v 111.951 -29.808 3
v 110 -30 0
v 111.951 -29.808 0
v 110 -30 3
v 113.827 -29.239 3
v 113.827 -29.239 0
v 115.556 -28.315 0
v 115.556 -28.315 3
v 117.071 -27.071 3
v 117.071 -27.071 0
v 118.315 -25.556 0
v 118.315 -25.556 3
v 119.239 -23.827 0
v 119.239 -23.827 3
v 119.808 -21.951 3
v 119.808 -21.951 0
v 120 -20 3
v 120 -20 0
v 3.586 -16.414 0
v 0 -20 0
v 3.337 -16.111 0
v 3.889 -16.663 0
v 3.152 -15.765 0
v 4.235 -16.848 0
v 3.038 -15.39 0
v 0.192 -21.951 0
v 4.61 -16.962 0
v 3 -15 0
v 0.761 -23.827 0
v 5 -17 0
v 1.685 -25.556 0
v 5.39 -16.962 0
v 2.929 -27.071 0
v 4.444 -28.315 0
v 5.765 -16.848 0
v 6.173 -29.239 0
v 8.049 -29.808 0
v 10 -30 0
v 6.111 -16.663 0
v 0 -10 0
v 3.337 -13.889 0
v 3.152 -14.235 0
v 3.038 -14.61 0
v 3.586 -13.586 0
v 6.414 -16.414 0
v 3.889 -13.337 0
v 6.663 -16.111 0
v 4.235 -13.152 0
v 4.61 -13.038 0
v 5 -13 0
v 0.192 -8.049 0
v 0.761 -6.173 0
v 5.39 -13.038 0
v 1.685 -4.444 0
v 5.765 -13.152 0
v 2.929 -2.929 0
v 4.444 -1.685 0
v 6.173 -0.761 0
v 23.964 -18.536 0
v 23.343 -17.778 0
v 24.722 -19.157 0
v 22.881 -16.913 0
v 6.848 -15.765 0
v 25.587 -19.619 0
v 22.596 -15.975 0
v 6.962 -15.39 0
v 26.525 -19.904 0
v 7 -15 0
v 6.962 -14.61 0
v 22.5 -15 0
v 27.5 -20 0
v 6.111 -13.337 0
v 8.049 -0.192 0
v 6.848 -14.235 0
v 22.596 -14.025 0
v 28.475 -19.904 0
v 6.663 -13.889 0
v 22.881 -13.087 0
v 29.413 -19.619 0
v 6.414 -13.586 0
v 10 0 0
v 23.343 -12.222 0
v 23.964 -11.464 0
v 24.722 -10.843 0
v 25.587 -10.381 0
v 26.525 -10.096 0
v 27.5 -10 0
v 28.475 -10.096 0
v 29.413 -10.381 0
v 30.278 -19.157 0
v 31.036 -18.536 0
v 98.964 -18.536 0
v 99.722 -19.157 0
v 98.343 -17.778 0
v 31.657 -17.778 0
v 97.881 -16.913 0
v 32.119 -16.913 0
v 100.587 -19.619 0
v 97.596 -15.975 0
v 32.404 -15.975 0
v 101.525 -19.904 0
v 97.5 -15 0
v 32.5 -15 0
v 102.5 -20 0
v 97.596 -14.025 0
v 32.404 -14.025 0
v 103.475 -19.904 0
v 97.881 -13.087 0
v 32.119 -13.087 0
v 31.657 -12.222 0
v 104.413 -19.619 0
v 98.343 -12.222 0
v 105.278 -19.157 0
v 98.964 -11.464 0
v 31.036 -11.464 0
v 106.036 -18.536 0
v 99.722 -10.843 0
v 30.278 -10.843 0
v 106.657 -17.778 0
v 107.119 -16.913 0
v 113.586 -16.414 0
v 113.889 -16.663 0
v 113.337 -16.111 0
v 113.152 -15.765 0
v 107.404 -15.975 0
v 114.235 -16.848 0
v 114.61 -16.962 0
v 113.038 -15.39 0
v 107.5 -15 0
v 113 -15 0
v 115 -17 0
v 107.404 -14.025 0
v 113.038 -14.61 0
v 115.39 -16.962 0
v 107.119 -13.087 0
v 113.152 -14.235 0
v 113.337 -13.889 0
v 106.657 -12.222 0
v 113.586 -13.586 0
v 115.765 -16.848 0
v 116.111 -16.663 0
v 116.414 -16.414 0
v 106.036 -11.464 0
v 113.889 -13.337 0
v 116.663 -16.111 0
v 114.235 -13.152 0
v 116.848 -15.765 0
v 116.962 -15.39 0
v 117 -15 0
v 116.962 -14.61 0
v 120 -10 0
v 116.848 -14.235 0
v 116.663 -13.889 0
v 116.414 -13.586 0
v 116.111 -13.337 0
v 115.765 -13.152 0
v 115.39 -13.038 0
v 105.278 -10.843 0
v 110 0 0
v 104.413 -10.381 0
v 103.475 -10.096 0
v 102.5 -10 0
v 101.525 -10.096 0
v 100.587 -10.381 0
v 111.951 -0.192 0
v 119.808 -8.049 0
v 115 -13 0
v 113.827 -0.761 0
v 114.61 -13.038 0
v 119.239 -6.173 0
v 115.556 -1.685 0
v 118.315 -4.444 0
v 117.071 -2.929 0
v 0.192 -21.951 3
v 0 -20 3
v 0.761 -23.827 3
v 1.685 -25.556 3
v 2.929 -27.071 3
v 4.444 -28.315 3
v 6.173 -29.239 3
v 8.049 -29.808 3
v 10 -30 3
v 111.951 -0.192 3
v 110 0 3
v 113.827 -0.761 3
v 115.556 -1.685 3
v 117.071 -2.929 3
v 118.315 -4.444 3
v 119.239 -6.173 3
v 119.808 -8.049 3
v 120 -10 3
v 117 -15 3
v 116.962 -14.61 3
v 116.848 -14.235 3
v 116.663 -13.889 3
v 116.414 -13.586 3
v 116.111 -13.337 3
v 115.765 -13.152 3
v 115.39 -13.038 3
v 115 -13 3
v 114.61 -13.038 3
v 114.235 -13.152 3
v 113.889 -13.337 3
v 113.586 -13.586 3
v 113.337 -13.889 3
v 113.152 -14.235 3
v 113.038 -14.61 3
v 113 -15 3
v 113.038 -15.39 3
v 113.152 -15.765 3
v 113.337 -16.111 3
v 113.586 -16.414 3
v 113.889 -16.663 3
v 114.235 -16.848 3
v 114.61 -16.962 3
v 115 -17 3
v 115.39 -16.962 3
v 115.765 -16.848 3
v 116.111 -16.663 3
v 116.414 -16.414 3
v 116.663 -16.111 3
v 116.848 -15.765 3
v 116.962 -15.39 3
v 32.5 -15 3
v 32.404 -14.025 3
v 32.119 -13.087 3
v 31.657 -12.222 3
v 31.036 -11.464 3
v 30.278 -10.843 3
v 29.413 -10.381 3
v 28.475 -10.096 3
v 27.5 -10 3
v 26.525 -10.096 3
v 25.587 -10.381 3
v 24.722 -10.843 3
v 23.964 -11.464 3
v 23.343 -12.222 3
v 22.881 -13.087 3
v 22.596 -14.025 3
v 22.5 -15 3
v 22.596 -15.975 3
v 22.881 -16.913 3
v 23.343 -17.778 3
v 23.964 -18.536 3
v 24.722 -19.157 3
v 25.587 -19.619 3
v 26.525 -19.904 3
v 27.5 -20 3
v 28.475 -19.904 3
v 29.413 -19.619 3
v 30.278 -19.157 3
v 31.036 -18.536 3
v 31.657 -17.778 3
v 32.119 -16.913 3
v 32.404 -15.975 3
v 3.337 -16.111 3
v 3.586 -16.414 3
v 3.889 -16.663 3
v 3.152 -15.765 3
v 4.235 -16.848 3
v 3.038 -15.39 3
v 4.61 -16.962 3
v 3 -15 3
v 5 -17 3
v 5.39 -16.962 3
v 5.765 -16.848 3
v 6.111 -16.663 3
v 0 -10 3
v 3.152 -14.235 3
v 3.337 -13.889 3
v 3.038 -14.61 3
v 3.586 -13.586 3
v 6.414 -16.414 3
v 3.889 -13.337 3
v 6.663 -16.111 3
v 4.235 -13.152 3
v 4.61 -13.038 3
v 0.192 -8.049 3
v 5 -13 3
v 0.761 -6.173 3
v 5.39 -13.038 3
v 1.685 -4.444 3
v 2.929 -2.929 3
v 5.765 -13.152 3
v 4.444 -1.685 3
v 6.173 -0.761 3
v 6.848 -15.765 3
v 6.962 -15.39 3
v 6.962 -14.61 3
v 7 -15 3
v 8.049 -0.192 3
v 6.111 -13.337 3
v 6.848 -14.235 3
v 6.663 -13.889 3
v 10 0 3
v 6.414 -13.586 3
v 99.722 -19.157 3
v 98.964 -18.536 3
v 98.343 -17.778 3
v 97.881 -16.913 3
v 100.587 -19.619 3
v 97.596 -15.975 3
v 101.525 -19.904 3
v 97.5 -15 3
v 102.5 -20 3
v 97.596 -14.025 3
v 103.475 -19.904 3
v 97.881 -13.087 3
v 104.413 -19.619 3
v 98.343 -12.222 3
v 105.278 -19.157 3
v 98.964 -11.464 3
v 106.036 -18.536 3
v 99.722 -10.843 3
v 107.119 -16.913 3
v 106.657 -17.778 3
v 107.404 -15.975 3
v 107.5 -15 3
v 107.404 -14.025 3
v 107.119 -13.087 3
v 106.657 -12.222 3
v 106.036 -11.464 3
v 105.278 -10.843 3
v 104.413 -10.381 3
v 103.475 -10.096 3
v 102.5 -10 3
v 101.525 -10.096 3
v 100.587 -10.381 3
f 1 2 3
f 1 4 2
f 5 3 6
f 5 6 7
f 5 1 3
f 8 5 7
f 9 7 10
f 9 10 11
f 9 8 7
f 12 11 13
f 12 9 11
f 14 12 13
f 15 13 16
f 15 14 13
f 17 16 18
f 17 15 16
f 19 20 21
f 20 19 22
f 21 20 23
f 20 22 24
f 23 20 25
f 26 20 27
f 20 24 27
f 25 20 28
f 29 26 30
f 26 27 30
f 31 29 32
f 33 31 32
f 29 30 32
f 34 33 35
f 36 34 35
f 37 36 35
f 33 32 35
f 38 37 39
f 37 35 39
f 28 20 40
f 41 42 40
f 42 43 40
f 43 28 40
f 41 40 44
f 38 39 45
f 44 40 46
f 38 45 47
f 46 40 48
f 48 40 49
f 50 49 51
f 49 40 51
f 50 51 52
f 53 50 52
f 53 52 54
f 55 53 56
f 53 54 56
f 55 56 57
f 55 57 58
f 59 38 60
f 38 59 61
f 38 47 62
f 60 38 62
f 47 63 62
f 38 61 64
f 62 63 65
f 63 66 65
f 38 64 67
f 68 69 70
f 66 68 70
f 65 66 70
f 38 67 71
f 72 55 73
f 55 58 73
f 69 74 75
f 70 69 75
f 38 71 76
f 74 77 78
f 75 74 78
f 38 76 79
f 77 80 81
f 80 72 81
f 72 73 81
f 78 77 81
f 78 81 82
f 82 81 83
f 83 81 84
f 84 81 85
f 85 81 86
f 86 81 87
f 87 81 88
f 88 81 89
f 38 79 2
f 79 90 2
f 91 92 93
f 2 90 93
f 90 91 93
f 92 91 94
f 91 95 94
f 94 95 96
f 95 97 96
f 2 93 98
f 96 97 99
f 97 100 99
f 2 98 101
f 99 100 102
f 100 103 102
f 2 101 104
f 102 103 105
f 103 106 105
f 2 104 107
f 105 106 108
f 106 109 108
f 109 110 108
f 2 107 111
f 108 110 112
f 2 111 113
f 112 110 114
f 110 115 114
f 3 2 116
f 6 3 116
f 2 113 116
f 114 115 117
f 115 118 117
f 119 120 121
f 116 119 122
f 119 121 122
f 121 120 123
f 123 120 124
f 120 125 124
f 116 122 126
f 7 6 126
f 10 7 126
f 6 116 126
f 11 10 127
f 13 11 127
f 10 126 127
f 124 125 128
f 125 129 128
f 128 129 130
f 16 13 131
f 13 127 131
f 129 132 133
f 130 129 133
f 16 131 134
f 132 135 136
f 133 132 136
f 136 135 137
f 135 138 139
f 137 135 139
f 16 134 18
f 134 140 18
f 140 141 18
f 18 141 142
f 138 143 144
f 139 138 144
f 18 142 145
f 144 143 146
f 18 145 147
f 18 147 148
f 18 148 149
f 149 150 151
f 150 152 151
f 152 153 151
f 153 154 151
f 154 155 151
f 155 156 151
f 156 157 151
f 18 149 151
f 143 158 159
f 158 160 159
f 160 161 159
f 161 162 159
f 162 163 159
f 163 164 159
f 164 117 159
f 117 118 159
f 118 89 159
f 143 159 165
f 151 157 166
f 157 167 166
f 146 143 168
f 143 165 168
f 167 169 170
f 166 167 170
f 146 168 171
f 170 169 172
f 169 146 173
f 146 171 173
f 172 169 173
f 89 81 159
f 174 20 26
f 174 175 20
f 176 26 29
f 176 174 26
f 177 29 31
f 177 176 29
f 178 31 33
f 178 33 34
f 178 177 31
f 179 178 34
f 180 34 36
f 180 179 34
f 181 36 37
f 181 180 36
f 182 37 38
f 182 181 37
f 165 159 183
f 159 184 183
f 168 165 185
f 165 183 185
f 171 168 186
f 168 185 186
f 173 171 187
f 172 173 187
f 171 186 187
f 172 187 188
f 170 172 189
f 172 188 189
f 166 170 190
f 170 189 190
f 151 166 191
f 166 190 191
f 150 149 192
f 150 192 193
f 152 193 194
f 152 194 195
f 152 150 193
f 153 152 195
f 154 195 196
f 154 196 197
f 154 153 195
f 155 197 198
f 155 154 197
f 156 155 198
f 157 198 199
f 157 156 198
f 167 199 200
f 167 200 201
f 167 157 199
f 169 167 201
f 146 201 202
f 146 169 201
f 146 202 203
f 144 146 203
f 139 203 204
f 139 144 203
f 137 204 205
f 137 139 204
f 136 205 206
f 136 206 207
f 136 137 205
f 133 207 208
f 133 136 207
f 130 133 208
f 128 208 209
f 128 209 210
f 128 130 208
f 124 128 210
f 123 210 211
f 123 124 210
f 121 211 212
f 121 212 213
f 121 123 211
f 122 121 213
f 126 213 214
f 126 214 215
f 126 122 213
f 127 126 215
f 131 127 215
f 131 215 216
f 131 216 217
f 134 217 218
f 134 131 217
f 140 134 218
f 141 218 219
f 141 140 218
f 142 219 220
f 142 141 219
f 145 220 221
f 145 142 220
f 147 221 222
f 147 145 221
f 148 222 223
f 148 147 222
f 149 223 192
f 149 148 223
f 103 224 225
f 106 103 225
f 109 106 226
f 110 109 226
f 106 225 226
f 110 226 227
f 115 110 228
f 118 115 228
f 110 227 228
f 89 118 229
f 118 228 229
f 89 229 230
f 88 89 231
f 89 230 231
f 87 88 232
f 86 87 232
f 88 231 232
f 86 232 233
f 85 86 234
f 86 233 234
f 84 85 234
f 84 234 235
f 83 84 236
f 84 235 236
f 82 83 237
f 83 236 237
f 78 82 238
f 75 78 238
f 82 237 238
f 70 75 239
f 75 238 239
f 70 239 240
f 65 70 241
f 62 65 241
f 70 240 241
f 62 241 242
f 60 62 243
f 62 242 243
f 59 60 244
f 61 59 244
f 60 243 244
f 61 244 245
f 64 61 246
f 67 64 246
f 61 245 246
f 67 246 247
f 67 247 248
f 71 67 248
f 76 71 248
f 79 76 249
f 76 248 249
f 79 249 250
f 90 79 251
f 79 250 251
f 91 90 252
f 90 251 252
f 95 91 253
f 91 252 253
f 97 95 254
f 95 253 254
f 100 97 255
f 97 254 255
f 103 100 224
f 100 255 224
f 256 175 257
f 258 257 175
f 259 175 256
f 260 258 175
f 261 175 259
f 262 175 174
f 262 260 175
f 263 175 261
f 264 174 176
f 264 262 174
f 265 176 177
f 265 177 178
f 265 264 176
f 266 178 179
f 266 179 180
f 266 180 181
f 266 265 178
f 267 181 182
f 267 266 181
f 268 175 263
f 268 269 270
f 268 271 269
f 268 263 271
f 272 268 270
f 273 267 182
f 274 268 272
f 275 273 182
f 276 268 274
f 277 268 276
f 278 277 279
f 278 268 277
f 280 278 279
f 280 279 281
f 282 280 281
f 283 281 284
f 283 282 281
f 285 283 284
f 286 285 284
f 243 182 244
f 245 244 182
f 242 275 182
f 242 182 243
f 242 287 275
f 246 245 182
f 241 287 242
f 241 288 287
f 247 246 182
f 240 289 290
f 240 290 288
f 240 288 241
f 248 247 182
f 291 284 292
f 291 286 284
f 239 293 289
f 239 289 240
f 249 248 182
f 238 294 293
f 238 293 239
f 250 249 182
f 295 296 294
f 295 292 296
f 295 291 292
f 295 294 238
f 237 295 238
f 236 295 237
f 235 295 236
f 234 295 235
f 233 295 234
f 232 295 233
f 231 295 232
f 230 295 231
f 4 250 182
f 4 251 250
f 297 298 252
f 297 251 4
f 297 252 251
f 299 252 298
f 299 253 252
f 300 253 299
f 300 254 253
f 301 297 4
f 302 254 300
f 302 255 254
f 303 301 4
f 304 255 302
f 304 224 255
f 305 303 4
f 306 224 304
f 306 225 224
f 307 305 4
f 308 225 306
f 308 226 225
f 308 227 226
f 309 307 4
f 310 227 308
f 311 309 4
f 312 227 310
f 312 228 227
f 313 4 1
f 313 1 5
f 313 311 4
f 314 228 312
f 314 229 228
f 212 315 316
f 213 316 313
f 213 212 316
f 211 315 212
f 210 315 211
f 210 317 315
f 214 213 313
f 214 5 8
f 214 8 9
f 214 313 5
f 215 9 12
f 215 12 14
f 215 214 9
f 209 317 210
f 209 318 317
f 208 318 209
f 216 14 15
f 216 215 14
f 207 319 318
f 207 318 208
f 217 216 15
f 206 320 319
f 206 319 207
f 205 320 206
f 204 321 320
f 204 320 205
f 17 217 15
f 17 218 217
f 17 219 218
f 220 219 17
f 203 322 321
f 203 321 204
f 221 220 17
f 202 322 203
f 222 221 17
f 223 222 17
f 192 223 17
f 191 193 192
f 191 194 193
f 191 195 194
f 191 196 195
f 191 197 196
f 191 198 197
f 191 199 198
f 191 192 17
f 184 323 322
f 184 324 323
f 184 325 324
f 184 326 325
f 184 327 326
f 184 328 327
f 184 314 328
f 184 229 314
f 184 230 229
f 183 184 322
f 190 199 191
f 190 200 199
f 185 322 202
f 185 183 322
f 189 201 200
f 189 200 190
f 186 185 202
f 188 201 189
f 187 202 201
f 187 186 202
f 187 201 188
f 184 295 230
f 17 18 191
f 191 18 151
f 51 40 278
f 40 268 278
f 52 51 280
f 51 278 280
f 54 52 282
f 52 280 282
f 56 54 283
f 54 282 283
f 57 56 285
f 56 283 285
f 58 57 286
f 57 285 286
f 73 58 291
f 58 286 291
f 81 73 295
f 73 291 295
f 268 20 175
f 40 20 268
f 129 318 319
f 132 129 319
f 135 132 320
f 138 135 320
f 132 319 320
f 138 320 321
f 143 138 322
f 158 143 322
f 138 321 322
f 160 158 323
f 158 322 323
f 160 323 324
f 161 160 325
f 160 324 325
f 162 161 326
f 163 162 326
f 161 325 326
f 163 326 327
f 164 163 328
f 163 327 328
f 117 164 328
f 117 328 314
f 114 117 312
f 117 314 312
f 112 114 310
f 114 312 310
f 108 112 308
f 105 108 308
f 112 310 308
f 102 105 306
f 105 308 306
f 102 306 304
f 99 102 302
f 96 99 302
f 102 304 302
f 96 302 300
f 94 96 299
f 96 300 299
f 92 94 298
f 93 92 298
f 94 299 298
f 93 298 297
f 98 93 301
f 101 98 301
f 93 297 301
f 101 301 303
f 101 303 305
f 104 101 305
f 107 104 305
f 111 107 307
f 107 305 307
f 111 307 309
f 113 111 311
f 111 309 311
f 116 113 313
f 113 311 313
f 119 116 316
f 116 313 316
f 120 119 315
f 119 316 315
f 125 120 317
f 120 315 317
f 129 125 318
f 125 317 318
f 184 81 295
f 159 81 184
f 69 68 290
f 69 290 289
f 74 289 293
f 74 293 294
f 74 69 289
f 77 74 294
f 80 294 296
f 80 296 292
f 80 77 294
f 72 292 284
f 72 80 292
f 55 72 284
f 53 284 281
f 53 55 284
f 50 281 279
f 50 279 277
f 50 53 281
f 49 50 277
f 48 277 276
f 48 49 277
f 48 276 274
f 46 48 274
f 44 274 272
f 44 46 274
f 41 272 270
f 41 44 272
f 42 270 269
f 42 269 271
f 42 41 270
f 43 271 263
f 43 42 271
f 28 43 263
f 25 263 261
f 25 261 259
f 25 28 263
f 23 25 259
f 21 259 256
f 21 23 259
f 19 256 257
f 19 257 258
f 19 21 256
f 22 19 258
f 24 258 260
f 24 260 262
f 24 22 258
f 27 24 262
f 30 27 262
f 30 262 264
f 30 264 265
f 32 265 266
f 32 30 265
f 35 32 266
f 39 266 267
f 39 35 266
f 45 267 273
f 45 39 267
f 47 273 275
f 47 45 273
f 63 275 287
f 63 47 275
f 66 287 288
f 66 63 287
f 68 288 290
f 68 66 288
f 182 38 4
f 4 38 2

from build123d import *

# Parameters (mm, degrees)
ESQUISSE1_W             = 120
ESQUISSE1_H             = 30
ESQUISSE1_R             = 2
BOSS_EXTRU_1_DEPTH      = 3
CONG_1_R                = 10
ESQUISSE2_R             = 5
ENL_V_MAT_EXTRU_1_DEPTH = 3


with BuildPart() as part:
    # Esquisse1 → Boss.-Extru.1 (new body)
    with BuildSketch(Plane.XY):
        with Locations((60, -15)):
            Rectangle(ESQUISSE1_W, ESQUISSE1_H)
        with Locations((115, -15)):
            Circle(ESQUISSE1_R, mode=Mode.SUBTRACT)
        with Locations((5, -15)):
            Circle(ESQUISSE1_R, mode=Mode.SUBTRACT)
    extrude(amount=BOSS_EXTRU_1_DEPTH)

    # Congé1
    cong_1_edges = [part.edges().sort_by_distance(p)[0] for p in [
        (0, 0, 1.5),
        (120, 0, 1.5),
        (120, -30, 1.5),
        (0, -30, 1.5),
    ]]
    fillet(cong_1_edges, radius=CONG_1_R)

    # Esquisse2 → Enlèv. mat.-Extru.1 (cut)
    with BuildSketch(Plane.XY.offset(3)):
        with Locations((27.5, -15)):
            Circle(ESQUISSE2_R)
        with Locations((102.5, -15)):
            Circle(ESQUISSE2_R)
    extrude(amount=-ENL_V_MAT_EXTRU_1_DEPTH, mode=Mode.SUBTRACT)


solid = part.part
